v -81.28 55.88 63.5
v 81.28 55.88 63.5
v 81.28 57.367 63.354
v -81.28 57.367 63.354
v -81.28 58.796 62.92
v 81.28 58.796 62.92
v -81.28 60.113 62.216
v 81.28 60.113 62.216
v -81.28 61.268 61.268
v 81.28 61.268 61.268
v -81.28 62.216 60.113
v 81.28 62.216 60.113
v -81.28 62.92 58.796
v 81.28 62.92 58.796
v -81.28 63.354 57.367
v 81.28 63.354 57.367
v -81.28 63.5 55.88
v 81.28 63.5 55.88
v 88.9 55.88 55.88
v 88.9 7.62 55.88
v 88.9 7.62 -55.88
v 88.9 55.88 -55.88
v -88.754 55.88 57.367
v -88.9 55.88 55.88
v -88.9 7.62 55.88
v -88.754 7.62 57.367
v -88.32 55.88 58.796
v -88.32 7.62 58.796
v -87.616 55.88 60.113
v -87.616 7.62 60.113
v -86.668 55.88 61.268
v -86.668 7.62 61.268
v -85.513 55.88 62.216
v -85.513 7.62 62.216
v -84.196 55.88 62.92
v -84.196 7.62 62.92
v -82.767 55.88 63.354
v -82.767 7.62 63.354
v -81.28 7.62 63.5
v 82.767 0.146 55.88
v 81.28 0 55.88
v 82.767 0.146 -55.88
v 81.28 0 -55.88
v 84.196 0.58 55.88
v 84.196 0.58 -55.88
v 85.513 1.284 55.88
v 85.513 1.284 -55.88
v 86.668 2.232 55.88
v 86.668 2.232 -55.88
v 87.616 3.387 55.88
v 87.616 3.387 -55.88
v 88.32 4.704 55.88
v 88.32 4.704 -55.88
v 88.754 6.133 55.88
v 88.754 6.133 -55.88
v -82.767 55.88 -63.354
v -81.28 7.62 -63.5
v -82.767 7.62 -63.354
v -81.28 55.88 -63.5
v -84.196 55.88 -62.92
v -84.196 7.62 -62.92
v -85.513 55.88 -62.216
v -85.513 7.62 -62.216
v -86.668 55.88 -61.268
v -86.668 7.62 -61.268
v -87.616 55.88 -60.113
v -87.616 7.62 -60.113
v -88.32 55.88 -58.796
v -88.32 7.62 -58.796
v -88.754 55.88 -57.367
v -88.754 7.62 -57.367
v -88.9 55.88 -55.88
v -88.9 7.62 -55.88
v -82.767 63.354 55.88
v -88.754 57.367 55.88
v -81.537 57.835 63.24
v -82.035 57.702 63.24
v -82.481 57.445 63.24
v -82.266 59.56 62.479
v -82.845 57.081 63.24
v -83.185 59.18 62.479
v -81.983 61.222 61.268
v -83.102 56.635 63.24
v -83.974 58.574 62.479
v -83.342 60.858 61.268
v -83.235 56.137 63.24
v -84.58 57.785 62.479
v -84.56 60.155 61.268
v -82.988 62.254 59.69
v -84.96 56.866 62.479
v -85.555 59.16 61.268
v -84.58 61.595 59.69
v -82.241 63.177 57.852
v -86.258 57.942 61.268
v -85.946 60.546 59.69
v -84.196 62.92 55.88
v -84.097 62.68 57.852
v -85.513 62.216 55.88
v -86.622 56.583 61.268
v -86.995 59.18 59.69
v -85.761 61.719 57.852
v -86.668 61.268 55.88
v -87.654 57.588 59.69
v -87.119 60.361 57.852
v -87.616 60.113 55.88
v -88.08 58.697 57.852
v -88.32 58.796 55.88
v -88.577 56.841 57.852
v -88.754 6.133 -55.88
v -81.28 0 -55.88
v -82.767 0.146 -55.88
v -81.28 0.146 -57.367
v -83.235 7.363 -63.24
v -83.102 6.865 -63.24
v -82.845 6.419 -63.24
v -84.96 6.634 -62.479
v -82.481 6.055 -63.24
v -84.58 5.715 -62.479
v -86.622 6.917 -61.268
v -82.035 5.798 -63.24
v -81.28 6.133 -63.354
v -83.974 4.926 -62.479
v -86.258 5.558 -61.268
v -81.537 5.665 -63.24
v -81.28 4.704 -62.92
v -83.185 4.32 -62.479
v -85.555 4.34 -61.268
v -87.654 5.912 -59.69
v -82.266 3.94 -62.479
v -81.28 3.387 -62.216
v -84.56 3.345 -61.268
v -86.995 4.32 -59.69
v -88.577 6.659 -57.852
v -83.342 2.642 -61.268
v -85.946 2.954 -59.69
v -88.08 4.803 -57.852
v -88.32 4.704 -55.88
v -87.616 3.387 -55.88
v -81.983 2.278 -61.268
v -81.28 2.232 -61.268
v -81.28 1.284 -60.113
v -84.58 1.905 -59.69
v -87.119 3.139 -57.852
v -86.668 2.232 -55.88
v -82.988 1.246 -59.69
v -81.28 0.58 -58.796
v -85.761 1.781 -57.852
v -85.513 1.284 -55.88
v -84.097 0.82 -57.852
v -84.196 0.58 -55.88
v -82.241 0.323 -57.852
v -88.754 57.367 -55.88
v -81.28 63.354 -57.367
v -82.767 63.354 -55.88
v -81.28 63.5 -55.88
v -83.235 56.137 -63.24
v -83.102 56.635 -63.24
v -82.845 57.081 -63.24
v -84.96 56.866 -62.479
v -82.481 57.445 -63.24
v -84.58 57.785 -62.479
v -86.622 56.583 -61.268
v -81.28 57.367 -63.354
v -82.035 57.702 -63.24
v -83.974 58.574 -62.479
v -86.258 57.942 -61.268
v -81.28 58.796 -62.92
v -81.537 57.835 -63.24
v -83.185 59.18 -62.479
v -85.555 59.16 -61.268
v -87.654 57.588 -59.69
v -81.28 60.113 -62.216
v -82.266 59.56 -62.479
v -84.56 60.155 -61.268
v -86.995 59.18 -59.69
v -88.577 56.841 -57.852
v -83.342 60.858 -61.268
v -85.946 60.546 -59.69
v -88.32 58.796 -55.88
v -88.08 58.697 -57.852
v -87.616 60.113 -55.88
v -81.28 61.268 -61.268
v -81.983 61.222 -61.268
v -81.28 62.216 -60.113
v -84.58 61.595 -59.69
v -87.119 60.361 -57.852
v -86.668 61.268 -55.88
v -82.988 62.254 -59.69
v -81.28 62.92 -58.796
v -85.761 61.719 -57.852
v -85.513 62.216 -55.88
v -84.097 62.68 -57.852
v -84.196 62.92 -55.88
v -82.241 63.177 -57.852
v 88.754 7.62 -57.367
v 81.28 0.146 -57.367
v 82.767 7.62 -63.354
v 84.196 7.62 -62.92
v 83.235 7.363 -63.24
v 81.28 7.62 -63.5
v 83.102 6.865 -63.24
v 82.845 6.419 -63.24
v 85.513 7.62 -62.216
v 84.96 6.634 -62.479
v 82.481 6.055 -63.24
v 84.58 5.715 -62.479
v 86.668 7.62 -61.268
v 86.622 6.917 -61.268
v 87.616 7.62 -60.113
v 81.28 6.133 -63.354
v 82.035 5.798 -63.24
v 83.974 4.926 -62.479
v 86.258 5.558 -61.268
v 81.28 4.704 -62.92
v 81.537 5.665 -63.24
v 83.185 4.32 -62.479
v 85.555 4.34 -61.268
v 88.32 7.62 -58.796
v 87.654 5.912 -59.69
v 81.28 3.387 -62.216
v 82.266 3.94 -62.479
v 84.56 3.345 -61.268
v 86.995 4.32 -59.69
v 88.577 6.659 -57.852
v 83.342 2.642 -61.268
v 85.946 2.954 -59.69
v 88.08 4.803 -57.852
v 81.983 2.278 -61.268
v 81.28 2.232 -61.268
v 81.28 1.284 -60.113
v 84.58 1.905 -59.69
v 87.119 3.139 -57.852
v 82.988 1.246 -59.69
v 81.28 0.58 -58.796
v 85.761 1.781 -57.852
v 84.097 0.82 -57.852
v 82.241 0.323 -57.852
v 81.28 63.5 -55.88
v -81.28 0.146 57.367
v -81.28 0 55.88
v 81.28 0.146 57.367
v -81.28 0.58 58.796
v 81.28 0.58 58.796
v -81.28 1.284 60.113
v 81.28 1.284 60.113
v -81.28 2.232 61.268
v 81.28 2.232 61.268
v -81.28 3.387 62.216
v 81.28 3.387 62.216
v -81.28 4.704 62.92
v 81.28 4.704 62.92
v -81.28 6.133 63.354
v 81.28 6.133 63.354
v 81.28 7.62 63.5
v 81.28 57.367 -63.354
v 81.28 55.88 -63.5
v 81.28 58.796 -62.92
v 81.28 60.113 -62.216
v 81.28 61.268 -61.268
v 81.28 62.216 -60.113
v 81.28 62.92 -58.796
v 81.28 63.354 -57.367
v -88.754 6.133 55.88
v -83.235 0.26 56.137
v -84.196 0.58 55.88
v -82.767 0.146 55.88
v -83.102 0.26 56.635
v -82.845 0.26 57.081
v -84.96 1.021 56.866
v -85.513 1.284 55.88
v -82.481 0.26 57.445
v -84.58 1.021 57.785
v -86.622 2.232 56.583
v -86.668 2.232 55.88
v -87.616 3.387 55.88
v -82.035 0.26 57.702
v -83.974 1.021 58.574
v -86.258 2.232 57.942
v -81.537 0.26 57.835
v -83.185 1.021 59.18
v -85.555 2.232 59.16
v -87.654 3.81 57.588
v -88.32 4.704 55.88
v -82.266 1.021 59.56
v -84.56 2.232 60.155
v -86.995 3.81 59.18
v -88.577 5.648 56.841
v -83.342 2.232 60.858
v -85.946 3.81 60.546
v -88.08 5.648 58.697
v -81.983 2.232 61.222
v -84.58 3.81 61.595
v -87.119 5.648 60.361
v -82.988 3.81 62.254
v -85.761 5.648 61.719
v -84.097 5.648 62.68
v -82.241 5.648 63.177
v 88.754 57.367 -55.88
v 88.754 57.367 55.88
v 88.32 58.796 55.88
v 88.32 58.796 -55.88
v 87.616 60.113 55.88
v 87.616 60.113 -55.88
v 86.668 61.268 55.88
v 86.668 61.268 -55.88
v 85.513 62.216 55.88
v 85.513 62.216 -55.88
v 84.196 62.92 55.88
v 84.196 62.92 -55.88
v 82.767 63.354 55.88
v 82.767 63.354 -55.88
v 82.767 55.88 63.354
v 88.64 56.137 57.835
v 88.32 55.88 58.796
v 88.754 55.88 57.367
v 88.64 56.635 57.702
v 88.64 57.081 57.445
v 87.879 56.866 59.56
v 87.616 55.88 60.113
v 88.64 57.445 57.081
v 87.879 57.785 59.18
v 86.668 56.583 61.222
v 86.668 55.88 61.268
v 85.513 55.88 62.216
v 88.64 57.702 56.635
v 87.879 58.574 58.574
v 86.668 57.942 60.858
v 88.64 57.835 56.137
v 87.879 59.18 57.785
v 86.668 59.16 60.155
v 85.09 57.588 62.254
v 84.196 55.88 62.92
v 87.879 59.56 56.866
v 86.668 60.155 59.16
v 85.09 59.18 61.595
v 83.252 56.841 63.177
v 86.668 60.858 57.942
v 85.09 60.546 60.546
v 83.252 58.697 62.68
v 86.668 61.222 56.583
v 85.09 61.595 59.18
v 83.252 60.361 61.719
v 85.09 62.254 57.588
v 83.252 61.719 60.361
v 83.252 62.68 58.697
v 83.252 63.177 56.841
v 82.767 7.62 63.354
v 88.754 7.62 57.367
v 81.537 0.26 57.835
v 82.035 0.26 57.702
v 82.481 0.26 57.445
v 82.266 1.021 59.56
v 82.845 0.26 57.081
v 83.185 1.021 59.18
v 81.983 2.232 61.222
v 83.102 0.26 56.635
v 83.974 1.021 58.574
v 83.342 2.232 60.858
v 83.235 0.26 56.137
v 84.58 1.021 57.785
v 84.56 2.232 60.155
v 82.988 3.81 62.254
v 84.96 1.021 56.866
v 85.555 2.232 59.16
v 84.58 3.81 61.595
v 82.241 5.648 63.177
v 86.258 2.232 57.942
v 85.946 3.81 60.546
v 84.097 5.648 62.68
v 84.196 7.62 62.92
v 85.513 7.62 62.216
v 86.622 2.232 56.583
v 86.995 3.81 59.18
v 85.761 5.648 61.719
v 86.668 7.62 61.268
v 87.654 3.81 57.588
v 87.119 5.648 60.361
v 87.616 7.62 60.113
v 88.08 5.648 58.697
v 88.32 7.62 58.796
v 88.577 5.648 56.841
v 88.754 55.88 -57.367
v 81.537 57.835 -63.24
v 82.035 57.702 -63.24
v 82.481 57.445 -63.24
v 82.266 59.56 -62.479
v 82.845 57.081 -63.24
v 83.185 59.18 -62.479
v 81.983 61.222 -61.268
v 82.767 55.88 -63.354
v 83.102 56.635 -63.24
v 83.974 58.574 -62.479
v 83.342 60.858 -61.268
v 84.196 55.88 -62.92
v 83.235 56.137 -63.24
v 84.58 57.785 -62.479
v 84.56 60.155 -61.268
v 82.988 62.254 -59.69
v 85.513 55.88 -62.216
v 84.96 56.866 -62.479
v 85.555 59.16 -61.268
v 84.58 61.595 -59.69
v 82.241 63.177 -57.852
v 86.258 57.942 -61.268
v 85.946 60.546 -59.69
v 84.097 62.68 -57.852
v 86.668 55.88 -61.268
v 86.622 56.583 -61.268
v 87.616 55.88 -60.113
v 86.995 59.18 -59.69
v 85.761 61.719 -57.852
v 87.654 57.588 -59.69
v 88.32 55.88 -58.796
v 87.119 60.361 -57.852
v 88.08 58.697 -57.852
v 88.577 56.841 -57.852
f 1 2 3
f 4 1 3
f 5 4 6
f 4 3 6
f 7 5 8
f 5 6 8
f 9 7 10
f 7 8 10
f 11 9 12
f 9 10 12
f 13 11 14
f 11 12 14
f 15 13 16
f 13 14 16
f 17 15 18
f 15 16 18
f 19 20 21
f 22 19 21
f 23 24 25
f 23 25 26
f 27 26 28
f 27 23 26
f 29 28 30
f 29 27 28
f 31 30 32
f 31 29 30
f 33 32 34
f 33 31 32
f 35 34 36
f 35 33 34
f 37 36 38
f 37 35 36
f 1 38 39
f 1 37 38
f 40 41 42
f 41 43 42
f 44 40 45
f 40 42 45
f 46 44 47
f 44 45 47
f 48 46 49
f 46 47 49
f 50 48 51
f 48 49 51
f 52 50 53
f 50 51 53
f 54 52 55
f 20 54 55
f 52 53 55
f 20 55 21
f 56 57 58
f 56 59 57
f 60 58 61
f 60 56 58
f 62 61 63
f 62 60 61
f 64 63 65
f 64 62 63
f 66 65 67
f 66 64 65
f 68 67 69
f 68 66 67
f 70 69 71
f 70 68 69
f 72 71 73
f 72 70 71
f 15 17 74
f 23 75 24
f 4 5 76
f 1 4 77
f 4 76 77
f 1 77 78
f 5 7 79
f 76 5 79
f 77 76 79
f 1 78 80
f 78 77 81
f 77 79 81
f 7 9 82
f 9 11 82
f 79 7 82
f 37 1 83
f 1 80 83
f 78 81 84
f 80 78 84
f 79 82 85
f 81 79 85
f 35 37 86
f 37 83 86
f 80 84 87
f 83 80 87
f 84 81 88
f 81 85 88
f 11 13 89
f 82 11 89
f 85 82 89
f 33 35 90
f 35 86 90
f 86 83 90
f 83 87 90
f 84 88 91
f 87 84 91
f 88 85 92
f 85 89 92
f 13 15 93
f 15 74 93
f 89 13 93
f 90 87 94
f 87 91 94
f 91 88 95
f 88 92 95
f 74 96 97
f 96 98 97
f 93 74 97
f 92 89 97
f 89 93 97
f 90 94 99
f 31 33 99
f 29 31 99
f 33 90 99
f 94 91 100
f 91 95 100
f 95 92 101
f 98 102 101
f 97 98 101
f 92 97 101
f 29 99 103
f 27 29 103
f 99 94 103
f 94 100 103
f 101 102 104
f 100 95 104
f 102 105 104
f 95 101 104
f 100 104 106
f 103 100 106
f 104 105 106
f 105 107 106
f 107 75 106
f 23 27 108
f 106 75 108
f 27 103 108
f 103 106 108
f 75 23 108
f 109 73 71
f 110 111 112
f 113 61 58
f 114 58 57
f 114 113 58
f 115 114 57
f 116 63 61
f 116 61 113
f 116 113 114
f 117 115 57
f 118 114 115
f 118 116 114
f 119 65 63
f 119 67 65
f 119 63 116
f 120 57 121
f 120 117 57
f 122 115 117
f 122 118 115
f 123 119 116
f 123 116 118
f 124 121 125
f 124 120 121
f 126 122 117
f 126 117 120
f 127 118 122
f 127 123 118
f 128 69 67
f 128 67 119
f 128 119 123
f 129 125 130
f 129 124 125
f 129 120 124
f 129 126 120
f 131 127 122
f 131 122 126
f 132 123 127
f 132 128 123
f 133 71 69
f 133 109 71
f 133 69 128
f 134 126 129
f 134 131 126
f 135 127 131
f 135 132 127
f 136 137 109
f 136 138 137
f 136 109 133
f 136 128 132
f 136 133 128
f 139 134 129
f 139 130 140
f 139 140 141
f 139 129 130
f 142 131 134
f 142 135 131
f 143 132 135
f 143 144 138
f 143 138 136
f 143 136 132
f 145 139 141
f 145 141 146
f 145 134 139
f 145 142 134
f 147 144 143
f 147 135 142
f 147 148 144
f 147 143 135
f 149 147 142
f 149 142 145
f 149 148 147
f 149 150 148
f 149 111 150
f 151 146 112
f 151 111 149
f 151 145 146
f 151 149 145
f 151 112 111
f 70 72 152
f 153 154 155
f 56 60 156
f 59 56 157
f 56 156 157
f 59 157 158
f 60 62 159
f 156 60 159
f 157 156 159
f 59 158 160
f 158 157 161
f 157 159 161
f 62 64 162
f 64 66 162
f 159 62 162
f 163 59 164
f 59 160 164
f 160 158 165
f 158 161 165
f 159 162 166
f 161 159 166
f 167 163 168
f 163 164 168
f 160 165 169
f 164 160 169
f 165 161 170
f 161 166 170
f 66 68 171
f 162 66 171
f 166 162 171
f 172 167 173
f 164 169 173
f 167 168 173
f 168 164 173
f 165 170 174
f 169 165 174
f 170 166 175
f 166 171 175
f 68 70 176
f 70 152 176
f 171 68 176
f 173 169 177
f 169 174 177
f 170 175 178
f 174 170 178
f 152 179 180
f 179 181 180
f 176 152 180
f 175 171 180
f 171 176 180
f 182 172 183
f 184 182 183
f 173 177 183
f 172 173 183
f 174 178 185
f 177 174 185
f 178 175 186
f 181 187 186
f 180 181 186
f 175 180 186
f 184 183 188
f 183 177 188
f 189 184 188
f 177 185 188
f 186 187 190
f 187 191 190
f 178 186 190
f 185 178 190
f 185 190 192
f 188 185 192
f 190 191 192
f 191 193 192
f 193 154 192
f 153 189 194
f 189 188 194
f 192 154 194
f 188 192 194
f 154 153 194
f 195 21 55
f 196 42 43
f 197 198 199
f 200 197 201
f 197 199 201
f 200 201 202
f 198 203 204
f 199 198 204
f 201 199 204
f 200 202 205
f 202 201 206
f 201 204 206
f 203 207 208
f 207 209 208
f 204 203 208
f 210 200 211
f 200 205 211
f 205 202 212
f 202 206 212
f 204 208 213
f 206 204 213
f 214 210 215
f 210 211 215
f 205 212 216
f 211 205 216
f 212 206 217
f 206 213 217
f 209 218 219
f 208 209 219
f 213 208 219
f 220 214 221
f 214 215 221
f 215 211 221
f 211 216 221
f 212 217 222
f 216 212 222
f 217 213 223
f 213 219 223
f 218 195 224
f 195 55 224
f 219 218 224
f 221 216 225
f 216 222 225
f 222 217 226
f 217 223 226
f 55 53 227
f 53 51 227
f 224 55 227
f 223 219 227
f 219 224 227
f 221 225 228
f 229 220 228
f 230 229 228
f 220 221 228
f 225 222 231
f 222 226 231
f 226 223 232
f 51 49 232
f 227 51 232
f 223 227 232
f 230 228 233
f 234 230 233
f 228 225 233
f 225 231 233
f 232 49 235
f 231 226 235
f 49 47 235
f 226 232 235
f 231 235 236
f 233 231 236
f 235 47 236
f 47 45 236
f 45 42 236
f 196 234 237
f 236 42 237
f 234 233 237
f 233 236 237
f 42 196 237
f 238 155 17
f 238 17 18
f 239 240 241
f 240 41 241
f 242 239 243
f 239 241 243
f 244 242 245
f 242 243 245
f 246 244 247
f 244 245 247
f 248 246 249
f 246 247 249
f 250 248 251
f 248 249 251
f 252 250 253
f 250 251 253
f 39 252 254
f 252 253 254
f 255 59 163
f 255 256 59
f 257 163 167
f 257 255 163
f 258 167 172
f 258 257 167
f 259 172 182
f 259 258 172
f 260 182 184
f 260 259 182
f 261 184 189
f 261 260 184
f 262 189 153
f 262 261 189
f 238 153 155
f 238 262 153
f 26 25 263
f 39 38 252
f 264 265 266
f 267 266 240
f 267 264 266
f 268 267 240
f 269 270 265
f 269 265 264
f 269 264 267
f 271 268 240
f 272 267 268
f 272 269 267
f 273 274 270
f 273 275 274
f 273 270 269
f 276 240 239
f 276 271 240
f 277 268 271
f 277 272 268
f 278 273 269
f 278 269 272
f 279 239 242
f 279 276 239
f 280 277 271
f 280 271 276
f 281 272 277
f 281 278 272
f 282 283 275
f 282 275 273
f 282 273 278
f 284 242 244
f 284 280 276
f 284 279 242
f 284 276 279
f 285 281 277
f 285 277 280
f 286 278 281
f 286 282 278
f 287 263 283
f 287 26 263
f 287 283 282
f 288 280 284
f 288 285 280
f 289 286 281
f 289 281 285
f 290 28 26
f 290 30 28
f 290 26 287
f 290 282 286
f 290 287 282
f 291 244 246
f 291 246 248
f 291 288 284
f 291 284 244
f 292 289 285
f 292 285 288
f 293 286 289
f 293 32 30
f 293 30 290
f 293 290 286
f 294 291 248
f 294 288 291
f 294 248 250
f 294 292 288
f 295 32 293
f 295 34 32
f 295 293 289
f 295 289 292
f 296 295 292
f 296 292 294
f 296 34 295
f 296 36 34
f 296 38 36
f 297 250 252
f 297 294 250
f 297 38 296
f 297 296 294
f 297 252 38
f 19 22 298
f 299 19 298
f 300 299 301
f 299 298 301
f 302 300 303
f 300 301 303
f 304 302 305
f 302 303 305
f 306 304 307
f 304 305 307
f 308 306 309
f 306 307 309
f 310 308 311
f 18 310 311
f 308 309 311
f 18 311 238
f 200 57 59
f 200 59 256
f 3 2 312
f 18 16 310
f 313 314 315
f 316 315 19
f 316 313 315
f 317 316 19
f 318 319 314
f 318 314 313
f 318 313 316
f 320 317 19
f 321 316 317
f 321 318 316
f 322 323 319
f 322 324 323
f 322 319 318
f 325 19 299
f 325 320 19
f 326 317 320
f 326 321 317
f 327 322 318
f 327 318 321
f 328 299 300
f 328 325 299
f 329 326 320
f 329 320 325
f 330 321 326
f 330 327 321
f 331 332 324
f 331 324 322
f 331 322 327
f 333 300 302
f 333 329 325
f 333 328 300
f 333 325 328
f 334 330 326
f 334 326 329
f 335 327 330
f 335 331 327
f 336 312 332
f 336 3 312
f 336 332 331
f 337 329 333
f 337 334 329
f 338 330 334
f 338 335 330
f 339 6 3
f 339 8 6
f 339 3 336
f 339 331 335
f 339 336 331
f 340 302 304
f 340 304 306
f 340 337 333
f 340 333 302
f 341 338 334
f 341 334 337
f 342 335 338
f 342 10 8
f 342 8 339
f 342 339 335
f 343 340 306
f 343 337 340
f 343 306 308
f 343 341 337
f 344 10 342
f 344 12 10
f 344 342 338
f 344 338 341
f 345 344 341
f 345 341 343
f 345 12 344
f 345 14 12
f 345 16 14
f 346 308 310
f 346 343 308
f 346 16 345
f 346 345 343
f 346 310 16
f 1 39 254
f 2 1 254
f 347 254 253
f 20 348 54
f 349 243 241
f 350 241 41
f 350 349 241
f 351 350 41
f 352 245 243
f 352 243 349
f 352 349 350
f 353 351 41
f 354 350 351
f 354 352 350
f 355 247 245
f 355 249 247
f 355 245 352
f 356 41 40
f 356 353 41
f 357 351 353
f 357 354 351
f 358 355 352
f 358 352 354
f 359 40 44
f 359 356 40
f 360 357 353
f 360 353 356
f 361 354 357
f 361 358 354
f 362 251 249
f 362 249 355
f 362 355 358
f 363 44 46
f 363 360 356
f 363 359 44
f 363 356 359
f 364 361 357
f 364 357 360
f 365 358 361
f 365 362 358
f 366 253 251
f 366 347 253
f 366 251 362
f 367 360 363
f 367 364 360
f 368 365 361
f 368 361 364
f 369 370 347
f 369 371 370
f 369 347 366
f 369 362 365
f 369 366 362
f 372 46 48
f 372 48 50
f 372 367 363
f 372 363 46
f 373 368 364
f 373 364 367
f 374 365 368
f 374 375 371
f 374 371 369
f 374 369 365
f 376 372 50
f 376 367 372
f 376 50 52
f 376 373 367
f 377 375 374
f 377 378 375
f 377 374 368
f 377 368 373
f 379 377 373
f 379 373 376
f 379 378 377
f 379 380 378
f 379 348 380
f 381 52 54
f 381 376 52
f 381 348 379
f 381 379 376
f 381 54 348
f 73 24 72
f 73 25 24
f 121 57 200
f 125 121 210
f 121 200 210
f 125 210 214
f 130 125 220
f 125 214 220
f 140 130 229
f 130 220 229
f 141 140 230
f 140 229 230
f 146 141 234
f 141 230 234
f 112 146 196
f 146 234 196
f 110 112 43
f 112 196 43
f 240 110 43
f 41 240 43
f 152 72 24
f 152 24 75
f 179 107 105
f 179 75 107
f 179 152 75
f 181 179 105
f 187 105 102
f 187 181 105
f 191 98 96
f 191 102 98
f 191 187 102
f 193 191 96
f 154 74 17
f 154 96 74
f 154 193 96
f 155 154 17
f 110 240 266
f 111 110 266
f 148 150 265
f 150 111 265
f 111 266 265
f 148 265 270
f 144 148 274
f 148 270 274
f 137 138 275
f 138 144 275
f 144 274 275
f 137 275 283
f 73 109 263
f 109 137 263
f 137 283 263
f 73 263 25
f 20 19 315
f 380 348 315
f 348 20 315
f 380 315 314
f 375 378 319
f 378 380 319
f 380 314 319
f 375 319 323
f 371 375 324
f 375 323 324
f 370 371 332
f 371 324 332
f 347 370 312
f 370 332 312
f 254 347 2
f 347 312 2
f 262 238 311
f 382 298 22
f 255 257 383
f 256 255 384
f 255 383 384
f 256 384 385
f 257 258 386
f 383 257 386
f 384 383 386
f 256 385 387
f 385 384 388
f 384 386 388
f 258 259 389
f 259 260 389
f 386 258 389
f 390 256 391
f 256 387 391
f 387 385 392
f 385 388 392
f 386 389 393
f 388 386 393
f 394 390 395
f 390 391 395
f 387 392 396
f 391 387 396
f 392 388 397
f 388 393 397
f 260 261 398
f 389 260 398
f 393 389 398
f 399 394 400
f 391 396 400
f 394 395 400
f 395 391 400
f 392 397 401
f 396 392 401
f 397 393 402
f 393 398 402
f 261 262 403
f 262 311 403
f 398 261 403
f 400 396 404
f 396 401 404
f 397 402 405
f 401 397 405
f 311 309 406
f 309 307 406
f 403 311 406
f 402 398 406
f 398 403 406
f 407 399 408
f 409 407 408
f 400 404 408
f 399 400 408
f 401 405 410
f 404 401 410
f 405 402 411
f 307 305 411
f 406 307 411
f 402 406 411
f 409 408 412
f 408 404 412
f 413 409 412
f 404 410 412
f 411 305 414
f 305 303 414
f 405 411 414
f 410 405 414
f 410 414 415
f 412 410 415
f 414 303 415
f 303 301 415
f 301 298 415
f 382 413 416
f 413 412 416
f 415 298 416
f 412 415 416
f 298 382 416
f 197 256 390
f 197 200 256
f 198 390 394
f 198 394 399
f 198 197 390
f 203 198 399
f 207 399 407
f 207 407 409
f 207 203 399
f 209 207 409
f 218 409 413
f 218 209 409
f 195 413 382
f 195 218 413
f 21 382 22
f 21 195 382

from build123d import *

# Parameters (mm, degrees)
SKETCH2_W           = 177.8
SKETCH2_H           = 127
BOSS_EXTRUDE1_DEPTH = 63.5
FILLET1_R           = 7.62
FILLET2_R           = 7.62
FILLET3_R           = 7.62


with BuildPart() as part:
    # Sketch2 → Boss-Extrude1 (new body)
    with BuildSketch(Plane(origin=(0, 0, 0), x_dir=(1, 0, 0), z_dir=(0, 1, 0))):
        Rectangle(SKETCH2_W, SKETCH2_H)
    extrude(amount=BOSS_EXTRUDE1_DEPTH)

    # Fillet1
    fillet1_edges = [part.edges().sort_by_distance(p)[0] for p in [
        (-88.9, 63.5, 0),
        (0, 63.5, 63.5),
        (-88.9, 31.75, 63.5),
    ]]
    fillet(fillet1_edges, radius=FILLET1_R)

    # Fillet2
    fillet2_edges = [part.edges().sort_by_distance(p)[0] for p in [
        (88.9, 27.94, 63.5),
        (88.9, 63.5, -3.81),
        (88.9, 61.268153673, 61.268153673),
    ]]
    fillet(fillet2_edges, radius=FILLET2_R)

    # Fillet3
    fillet3_edges = [part.edges().sort_by_distance(p)[0] for p in [
        (0, 0, 63.5),
        (-86.668153673, 0, 61.268153673),
        (-88.9, 27.94, -63.5),
        (-86.668153673, 61.268153673, -63.5),
        (0, 63.5, -63.5),
        (88.9, 27.94, -63.5),
        (86.668153673, 61.268153673, -63.5),
        (88.9, 0, -3.81),
        (86.668153673, 0, 61.268153673),
        (-88.9, 0, -3.81),
        (0, 0, -63.5),
    ]]
    fillet(fillet3_edges, radius=FILLET3_R)


solid = part.part
